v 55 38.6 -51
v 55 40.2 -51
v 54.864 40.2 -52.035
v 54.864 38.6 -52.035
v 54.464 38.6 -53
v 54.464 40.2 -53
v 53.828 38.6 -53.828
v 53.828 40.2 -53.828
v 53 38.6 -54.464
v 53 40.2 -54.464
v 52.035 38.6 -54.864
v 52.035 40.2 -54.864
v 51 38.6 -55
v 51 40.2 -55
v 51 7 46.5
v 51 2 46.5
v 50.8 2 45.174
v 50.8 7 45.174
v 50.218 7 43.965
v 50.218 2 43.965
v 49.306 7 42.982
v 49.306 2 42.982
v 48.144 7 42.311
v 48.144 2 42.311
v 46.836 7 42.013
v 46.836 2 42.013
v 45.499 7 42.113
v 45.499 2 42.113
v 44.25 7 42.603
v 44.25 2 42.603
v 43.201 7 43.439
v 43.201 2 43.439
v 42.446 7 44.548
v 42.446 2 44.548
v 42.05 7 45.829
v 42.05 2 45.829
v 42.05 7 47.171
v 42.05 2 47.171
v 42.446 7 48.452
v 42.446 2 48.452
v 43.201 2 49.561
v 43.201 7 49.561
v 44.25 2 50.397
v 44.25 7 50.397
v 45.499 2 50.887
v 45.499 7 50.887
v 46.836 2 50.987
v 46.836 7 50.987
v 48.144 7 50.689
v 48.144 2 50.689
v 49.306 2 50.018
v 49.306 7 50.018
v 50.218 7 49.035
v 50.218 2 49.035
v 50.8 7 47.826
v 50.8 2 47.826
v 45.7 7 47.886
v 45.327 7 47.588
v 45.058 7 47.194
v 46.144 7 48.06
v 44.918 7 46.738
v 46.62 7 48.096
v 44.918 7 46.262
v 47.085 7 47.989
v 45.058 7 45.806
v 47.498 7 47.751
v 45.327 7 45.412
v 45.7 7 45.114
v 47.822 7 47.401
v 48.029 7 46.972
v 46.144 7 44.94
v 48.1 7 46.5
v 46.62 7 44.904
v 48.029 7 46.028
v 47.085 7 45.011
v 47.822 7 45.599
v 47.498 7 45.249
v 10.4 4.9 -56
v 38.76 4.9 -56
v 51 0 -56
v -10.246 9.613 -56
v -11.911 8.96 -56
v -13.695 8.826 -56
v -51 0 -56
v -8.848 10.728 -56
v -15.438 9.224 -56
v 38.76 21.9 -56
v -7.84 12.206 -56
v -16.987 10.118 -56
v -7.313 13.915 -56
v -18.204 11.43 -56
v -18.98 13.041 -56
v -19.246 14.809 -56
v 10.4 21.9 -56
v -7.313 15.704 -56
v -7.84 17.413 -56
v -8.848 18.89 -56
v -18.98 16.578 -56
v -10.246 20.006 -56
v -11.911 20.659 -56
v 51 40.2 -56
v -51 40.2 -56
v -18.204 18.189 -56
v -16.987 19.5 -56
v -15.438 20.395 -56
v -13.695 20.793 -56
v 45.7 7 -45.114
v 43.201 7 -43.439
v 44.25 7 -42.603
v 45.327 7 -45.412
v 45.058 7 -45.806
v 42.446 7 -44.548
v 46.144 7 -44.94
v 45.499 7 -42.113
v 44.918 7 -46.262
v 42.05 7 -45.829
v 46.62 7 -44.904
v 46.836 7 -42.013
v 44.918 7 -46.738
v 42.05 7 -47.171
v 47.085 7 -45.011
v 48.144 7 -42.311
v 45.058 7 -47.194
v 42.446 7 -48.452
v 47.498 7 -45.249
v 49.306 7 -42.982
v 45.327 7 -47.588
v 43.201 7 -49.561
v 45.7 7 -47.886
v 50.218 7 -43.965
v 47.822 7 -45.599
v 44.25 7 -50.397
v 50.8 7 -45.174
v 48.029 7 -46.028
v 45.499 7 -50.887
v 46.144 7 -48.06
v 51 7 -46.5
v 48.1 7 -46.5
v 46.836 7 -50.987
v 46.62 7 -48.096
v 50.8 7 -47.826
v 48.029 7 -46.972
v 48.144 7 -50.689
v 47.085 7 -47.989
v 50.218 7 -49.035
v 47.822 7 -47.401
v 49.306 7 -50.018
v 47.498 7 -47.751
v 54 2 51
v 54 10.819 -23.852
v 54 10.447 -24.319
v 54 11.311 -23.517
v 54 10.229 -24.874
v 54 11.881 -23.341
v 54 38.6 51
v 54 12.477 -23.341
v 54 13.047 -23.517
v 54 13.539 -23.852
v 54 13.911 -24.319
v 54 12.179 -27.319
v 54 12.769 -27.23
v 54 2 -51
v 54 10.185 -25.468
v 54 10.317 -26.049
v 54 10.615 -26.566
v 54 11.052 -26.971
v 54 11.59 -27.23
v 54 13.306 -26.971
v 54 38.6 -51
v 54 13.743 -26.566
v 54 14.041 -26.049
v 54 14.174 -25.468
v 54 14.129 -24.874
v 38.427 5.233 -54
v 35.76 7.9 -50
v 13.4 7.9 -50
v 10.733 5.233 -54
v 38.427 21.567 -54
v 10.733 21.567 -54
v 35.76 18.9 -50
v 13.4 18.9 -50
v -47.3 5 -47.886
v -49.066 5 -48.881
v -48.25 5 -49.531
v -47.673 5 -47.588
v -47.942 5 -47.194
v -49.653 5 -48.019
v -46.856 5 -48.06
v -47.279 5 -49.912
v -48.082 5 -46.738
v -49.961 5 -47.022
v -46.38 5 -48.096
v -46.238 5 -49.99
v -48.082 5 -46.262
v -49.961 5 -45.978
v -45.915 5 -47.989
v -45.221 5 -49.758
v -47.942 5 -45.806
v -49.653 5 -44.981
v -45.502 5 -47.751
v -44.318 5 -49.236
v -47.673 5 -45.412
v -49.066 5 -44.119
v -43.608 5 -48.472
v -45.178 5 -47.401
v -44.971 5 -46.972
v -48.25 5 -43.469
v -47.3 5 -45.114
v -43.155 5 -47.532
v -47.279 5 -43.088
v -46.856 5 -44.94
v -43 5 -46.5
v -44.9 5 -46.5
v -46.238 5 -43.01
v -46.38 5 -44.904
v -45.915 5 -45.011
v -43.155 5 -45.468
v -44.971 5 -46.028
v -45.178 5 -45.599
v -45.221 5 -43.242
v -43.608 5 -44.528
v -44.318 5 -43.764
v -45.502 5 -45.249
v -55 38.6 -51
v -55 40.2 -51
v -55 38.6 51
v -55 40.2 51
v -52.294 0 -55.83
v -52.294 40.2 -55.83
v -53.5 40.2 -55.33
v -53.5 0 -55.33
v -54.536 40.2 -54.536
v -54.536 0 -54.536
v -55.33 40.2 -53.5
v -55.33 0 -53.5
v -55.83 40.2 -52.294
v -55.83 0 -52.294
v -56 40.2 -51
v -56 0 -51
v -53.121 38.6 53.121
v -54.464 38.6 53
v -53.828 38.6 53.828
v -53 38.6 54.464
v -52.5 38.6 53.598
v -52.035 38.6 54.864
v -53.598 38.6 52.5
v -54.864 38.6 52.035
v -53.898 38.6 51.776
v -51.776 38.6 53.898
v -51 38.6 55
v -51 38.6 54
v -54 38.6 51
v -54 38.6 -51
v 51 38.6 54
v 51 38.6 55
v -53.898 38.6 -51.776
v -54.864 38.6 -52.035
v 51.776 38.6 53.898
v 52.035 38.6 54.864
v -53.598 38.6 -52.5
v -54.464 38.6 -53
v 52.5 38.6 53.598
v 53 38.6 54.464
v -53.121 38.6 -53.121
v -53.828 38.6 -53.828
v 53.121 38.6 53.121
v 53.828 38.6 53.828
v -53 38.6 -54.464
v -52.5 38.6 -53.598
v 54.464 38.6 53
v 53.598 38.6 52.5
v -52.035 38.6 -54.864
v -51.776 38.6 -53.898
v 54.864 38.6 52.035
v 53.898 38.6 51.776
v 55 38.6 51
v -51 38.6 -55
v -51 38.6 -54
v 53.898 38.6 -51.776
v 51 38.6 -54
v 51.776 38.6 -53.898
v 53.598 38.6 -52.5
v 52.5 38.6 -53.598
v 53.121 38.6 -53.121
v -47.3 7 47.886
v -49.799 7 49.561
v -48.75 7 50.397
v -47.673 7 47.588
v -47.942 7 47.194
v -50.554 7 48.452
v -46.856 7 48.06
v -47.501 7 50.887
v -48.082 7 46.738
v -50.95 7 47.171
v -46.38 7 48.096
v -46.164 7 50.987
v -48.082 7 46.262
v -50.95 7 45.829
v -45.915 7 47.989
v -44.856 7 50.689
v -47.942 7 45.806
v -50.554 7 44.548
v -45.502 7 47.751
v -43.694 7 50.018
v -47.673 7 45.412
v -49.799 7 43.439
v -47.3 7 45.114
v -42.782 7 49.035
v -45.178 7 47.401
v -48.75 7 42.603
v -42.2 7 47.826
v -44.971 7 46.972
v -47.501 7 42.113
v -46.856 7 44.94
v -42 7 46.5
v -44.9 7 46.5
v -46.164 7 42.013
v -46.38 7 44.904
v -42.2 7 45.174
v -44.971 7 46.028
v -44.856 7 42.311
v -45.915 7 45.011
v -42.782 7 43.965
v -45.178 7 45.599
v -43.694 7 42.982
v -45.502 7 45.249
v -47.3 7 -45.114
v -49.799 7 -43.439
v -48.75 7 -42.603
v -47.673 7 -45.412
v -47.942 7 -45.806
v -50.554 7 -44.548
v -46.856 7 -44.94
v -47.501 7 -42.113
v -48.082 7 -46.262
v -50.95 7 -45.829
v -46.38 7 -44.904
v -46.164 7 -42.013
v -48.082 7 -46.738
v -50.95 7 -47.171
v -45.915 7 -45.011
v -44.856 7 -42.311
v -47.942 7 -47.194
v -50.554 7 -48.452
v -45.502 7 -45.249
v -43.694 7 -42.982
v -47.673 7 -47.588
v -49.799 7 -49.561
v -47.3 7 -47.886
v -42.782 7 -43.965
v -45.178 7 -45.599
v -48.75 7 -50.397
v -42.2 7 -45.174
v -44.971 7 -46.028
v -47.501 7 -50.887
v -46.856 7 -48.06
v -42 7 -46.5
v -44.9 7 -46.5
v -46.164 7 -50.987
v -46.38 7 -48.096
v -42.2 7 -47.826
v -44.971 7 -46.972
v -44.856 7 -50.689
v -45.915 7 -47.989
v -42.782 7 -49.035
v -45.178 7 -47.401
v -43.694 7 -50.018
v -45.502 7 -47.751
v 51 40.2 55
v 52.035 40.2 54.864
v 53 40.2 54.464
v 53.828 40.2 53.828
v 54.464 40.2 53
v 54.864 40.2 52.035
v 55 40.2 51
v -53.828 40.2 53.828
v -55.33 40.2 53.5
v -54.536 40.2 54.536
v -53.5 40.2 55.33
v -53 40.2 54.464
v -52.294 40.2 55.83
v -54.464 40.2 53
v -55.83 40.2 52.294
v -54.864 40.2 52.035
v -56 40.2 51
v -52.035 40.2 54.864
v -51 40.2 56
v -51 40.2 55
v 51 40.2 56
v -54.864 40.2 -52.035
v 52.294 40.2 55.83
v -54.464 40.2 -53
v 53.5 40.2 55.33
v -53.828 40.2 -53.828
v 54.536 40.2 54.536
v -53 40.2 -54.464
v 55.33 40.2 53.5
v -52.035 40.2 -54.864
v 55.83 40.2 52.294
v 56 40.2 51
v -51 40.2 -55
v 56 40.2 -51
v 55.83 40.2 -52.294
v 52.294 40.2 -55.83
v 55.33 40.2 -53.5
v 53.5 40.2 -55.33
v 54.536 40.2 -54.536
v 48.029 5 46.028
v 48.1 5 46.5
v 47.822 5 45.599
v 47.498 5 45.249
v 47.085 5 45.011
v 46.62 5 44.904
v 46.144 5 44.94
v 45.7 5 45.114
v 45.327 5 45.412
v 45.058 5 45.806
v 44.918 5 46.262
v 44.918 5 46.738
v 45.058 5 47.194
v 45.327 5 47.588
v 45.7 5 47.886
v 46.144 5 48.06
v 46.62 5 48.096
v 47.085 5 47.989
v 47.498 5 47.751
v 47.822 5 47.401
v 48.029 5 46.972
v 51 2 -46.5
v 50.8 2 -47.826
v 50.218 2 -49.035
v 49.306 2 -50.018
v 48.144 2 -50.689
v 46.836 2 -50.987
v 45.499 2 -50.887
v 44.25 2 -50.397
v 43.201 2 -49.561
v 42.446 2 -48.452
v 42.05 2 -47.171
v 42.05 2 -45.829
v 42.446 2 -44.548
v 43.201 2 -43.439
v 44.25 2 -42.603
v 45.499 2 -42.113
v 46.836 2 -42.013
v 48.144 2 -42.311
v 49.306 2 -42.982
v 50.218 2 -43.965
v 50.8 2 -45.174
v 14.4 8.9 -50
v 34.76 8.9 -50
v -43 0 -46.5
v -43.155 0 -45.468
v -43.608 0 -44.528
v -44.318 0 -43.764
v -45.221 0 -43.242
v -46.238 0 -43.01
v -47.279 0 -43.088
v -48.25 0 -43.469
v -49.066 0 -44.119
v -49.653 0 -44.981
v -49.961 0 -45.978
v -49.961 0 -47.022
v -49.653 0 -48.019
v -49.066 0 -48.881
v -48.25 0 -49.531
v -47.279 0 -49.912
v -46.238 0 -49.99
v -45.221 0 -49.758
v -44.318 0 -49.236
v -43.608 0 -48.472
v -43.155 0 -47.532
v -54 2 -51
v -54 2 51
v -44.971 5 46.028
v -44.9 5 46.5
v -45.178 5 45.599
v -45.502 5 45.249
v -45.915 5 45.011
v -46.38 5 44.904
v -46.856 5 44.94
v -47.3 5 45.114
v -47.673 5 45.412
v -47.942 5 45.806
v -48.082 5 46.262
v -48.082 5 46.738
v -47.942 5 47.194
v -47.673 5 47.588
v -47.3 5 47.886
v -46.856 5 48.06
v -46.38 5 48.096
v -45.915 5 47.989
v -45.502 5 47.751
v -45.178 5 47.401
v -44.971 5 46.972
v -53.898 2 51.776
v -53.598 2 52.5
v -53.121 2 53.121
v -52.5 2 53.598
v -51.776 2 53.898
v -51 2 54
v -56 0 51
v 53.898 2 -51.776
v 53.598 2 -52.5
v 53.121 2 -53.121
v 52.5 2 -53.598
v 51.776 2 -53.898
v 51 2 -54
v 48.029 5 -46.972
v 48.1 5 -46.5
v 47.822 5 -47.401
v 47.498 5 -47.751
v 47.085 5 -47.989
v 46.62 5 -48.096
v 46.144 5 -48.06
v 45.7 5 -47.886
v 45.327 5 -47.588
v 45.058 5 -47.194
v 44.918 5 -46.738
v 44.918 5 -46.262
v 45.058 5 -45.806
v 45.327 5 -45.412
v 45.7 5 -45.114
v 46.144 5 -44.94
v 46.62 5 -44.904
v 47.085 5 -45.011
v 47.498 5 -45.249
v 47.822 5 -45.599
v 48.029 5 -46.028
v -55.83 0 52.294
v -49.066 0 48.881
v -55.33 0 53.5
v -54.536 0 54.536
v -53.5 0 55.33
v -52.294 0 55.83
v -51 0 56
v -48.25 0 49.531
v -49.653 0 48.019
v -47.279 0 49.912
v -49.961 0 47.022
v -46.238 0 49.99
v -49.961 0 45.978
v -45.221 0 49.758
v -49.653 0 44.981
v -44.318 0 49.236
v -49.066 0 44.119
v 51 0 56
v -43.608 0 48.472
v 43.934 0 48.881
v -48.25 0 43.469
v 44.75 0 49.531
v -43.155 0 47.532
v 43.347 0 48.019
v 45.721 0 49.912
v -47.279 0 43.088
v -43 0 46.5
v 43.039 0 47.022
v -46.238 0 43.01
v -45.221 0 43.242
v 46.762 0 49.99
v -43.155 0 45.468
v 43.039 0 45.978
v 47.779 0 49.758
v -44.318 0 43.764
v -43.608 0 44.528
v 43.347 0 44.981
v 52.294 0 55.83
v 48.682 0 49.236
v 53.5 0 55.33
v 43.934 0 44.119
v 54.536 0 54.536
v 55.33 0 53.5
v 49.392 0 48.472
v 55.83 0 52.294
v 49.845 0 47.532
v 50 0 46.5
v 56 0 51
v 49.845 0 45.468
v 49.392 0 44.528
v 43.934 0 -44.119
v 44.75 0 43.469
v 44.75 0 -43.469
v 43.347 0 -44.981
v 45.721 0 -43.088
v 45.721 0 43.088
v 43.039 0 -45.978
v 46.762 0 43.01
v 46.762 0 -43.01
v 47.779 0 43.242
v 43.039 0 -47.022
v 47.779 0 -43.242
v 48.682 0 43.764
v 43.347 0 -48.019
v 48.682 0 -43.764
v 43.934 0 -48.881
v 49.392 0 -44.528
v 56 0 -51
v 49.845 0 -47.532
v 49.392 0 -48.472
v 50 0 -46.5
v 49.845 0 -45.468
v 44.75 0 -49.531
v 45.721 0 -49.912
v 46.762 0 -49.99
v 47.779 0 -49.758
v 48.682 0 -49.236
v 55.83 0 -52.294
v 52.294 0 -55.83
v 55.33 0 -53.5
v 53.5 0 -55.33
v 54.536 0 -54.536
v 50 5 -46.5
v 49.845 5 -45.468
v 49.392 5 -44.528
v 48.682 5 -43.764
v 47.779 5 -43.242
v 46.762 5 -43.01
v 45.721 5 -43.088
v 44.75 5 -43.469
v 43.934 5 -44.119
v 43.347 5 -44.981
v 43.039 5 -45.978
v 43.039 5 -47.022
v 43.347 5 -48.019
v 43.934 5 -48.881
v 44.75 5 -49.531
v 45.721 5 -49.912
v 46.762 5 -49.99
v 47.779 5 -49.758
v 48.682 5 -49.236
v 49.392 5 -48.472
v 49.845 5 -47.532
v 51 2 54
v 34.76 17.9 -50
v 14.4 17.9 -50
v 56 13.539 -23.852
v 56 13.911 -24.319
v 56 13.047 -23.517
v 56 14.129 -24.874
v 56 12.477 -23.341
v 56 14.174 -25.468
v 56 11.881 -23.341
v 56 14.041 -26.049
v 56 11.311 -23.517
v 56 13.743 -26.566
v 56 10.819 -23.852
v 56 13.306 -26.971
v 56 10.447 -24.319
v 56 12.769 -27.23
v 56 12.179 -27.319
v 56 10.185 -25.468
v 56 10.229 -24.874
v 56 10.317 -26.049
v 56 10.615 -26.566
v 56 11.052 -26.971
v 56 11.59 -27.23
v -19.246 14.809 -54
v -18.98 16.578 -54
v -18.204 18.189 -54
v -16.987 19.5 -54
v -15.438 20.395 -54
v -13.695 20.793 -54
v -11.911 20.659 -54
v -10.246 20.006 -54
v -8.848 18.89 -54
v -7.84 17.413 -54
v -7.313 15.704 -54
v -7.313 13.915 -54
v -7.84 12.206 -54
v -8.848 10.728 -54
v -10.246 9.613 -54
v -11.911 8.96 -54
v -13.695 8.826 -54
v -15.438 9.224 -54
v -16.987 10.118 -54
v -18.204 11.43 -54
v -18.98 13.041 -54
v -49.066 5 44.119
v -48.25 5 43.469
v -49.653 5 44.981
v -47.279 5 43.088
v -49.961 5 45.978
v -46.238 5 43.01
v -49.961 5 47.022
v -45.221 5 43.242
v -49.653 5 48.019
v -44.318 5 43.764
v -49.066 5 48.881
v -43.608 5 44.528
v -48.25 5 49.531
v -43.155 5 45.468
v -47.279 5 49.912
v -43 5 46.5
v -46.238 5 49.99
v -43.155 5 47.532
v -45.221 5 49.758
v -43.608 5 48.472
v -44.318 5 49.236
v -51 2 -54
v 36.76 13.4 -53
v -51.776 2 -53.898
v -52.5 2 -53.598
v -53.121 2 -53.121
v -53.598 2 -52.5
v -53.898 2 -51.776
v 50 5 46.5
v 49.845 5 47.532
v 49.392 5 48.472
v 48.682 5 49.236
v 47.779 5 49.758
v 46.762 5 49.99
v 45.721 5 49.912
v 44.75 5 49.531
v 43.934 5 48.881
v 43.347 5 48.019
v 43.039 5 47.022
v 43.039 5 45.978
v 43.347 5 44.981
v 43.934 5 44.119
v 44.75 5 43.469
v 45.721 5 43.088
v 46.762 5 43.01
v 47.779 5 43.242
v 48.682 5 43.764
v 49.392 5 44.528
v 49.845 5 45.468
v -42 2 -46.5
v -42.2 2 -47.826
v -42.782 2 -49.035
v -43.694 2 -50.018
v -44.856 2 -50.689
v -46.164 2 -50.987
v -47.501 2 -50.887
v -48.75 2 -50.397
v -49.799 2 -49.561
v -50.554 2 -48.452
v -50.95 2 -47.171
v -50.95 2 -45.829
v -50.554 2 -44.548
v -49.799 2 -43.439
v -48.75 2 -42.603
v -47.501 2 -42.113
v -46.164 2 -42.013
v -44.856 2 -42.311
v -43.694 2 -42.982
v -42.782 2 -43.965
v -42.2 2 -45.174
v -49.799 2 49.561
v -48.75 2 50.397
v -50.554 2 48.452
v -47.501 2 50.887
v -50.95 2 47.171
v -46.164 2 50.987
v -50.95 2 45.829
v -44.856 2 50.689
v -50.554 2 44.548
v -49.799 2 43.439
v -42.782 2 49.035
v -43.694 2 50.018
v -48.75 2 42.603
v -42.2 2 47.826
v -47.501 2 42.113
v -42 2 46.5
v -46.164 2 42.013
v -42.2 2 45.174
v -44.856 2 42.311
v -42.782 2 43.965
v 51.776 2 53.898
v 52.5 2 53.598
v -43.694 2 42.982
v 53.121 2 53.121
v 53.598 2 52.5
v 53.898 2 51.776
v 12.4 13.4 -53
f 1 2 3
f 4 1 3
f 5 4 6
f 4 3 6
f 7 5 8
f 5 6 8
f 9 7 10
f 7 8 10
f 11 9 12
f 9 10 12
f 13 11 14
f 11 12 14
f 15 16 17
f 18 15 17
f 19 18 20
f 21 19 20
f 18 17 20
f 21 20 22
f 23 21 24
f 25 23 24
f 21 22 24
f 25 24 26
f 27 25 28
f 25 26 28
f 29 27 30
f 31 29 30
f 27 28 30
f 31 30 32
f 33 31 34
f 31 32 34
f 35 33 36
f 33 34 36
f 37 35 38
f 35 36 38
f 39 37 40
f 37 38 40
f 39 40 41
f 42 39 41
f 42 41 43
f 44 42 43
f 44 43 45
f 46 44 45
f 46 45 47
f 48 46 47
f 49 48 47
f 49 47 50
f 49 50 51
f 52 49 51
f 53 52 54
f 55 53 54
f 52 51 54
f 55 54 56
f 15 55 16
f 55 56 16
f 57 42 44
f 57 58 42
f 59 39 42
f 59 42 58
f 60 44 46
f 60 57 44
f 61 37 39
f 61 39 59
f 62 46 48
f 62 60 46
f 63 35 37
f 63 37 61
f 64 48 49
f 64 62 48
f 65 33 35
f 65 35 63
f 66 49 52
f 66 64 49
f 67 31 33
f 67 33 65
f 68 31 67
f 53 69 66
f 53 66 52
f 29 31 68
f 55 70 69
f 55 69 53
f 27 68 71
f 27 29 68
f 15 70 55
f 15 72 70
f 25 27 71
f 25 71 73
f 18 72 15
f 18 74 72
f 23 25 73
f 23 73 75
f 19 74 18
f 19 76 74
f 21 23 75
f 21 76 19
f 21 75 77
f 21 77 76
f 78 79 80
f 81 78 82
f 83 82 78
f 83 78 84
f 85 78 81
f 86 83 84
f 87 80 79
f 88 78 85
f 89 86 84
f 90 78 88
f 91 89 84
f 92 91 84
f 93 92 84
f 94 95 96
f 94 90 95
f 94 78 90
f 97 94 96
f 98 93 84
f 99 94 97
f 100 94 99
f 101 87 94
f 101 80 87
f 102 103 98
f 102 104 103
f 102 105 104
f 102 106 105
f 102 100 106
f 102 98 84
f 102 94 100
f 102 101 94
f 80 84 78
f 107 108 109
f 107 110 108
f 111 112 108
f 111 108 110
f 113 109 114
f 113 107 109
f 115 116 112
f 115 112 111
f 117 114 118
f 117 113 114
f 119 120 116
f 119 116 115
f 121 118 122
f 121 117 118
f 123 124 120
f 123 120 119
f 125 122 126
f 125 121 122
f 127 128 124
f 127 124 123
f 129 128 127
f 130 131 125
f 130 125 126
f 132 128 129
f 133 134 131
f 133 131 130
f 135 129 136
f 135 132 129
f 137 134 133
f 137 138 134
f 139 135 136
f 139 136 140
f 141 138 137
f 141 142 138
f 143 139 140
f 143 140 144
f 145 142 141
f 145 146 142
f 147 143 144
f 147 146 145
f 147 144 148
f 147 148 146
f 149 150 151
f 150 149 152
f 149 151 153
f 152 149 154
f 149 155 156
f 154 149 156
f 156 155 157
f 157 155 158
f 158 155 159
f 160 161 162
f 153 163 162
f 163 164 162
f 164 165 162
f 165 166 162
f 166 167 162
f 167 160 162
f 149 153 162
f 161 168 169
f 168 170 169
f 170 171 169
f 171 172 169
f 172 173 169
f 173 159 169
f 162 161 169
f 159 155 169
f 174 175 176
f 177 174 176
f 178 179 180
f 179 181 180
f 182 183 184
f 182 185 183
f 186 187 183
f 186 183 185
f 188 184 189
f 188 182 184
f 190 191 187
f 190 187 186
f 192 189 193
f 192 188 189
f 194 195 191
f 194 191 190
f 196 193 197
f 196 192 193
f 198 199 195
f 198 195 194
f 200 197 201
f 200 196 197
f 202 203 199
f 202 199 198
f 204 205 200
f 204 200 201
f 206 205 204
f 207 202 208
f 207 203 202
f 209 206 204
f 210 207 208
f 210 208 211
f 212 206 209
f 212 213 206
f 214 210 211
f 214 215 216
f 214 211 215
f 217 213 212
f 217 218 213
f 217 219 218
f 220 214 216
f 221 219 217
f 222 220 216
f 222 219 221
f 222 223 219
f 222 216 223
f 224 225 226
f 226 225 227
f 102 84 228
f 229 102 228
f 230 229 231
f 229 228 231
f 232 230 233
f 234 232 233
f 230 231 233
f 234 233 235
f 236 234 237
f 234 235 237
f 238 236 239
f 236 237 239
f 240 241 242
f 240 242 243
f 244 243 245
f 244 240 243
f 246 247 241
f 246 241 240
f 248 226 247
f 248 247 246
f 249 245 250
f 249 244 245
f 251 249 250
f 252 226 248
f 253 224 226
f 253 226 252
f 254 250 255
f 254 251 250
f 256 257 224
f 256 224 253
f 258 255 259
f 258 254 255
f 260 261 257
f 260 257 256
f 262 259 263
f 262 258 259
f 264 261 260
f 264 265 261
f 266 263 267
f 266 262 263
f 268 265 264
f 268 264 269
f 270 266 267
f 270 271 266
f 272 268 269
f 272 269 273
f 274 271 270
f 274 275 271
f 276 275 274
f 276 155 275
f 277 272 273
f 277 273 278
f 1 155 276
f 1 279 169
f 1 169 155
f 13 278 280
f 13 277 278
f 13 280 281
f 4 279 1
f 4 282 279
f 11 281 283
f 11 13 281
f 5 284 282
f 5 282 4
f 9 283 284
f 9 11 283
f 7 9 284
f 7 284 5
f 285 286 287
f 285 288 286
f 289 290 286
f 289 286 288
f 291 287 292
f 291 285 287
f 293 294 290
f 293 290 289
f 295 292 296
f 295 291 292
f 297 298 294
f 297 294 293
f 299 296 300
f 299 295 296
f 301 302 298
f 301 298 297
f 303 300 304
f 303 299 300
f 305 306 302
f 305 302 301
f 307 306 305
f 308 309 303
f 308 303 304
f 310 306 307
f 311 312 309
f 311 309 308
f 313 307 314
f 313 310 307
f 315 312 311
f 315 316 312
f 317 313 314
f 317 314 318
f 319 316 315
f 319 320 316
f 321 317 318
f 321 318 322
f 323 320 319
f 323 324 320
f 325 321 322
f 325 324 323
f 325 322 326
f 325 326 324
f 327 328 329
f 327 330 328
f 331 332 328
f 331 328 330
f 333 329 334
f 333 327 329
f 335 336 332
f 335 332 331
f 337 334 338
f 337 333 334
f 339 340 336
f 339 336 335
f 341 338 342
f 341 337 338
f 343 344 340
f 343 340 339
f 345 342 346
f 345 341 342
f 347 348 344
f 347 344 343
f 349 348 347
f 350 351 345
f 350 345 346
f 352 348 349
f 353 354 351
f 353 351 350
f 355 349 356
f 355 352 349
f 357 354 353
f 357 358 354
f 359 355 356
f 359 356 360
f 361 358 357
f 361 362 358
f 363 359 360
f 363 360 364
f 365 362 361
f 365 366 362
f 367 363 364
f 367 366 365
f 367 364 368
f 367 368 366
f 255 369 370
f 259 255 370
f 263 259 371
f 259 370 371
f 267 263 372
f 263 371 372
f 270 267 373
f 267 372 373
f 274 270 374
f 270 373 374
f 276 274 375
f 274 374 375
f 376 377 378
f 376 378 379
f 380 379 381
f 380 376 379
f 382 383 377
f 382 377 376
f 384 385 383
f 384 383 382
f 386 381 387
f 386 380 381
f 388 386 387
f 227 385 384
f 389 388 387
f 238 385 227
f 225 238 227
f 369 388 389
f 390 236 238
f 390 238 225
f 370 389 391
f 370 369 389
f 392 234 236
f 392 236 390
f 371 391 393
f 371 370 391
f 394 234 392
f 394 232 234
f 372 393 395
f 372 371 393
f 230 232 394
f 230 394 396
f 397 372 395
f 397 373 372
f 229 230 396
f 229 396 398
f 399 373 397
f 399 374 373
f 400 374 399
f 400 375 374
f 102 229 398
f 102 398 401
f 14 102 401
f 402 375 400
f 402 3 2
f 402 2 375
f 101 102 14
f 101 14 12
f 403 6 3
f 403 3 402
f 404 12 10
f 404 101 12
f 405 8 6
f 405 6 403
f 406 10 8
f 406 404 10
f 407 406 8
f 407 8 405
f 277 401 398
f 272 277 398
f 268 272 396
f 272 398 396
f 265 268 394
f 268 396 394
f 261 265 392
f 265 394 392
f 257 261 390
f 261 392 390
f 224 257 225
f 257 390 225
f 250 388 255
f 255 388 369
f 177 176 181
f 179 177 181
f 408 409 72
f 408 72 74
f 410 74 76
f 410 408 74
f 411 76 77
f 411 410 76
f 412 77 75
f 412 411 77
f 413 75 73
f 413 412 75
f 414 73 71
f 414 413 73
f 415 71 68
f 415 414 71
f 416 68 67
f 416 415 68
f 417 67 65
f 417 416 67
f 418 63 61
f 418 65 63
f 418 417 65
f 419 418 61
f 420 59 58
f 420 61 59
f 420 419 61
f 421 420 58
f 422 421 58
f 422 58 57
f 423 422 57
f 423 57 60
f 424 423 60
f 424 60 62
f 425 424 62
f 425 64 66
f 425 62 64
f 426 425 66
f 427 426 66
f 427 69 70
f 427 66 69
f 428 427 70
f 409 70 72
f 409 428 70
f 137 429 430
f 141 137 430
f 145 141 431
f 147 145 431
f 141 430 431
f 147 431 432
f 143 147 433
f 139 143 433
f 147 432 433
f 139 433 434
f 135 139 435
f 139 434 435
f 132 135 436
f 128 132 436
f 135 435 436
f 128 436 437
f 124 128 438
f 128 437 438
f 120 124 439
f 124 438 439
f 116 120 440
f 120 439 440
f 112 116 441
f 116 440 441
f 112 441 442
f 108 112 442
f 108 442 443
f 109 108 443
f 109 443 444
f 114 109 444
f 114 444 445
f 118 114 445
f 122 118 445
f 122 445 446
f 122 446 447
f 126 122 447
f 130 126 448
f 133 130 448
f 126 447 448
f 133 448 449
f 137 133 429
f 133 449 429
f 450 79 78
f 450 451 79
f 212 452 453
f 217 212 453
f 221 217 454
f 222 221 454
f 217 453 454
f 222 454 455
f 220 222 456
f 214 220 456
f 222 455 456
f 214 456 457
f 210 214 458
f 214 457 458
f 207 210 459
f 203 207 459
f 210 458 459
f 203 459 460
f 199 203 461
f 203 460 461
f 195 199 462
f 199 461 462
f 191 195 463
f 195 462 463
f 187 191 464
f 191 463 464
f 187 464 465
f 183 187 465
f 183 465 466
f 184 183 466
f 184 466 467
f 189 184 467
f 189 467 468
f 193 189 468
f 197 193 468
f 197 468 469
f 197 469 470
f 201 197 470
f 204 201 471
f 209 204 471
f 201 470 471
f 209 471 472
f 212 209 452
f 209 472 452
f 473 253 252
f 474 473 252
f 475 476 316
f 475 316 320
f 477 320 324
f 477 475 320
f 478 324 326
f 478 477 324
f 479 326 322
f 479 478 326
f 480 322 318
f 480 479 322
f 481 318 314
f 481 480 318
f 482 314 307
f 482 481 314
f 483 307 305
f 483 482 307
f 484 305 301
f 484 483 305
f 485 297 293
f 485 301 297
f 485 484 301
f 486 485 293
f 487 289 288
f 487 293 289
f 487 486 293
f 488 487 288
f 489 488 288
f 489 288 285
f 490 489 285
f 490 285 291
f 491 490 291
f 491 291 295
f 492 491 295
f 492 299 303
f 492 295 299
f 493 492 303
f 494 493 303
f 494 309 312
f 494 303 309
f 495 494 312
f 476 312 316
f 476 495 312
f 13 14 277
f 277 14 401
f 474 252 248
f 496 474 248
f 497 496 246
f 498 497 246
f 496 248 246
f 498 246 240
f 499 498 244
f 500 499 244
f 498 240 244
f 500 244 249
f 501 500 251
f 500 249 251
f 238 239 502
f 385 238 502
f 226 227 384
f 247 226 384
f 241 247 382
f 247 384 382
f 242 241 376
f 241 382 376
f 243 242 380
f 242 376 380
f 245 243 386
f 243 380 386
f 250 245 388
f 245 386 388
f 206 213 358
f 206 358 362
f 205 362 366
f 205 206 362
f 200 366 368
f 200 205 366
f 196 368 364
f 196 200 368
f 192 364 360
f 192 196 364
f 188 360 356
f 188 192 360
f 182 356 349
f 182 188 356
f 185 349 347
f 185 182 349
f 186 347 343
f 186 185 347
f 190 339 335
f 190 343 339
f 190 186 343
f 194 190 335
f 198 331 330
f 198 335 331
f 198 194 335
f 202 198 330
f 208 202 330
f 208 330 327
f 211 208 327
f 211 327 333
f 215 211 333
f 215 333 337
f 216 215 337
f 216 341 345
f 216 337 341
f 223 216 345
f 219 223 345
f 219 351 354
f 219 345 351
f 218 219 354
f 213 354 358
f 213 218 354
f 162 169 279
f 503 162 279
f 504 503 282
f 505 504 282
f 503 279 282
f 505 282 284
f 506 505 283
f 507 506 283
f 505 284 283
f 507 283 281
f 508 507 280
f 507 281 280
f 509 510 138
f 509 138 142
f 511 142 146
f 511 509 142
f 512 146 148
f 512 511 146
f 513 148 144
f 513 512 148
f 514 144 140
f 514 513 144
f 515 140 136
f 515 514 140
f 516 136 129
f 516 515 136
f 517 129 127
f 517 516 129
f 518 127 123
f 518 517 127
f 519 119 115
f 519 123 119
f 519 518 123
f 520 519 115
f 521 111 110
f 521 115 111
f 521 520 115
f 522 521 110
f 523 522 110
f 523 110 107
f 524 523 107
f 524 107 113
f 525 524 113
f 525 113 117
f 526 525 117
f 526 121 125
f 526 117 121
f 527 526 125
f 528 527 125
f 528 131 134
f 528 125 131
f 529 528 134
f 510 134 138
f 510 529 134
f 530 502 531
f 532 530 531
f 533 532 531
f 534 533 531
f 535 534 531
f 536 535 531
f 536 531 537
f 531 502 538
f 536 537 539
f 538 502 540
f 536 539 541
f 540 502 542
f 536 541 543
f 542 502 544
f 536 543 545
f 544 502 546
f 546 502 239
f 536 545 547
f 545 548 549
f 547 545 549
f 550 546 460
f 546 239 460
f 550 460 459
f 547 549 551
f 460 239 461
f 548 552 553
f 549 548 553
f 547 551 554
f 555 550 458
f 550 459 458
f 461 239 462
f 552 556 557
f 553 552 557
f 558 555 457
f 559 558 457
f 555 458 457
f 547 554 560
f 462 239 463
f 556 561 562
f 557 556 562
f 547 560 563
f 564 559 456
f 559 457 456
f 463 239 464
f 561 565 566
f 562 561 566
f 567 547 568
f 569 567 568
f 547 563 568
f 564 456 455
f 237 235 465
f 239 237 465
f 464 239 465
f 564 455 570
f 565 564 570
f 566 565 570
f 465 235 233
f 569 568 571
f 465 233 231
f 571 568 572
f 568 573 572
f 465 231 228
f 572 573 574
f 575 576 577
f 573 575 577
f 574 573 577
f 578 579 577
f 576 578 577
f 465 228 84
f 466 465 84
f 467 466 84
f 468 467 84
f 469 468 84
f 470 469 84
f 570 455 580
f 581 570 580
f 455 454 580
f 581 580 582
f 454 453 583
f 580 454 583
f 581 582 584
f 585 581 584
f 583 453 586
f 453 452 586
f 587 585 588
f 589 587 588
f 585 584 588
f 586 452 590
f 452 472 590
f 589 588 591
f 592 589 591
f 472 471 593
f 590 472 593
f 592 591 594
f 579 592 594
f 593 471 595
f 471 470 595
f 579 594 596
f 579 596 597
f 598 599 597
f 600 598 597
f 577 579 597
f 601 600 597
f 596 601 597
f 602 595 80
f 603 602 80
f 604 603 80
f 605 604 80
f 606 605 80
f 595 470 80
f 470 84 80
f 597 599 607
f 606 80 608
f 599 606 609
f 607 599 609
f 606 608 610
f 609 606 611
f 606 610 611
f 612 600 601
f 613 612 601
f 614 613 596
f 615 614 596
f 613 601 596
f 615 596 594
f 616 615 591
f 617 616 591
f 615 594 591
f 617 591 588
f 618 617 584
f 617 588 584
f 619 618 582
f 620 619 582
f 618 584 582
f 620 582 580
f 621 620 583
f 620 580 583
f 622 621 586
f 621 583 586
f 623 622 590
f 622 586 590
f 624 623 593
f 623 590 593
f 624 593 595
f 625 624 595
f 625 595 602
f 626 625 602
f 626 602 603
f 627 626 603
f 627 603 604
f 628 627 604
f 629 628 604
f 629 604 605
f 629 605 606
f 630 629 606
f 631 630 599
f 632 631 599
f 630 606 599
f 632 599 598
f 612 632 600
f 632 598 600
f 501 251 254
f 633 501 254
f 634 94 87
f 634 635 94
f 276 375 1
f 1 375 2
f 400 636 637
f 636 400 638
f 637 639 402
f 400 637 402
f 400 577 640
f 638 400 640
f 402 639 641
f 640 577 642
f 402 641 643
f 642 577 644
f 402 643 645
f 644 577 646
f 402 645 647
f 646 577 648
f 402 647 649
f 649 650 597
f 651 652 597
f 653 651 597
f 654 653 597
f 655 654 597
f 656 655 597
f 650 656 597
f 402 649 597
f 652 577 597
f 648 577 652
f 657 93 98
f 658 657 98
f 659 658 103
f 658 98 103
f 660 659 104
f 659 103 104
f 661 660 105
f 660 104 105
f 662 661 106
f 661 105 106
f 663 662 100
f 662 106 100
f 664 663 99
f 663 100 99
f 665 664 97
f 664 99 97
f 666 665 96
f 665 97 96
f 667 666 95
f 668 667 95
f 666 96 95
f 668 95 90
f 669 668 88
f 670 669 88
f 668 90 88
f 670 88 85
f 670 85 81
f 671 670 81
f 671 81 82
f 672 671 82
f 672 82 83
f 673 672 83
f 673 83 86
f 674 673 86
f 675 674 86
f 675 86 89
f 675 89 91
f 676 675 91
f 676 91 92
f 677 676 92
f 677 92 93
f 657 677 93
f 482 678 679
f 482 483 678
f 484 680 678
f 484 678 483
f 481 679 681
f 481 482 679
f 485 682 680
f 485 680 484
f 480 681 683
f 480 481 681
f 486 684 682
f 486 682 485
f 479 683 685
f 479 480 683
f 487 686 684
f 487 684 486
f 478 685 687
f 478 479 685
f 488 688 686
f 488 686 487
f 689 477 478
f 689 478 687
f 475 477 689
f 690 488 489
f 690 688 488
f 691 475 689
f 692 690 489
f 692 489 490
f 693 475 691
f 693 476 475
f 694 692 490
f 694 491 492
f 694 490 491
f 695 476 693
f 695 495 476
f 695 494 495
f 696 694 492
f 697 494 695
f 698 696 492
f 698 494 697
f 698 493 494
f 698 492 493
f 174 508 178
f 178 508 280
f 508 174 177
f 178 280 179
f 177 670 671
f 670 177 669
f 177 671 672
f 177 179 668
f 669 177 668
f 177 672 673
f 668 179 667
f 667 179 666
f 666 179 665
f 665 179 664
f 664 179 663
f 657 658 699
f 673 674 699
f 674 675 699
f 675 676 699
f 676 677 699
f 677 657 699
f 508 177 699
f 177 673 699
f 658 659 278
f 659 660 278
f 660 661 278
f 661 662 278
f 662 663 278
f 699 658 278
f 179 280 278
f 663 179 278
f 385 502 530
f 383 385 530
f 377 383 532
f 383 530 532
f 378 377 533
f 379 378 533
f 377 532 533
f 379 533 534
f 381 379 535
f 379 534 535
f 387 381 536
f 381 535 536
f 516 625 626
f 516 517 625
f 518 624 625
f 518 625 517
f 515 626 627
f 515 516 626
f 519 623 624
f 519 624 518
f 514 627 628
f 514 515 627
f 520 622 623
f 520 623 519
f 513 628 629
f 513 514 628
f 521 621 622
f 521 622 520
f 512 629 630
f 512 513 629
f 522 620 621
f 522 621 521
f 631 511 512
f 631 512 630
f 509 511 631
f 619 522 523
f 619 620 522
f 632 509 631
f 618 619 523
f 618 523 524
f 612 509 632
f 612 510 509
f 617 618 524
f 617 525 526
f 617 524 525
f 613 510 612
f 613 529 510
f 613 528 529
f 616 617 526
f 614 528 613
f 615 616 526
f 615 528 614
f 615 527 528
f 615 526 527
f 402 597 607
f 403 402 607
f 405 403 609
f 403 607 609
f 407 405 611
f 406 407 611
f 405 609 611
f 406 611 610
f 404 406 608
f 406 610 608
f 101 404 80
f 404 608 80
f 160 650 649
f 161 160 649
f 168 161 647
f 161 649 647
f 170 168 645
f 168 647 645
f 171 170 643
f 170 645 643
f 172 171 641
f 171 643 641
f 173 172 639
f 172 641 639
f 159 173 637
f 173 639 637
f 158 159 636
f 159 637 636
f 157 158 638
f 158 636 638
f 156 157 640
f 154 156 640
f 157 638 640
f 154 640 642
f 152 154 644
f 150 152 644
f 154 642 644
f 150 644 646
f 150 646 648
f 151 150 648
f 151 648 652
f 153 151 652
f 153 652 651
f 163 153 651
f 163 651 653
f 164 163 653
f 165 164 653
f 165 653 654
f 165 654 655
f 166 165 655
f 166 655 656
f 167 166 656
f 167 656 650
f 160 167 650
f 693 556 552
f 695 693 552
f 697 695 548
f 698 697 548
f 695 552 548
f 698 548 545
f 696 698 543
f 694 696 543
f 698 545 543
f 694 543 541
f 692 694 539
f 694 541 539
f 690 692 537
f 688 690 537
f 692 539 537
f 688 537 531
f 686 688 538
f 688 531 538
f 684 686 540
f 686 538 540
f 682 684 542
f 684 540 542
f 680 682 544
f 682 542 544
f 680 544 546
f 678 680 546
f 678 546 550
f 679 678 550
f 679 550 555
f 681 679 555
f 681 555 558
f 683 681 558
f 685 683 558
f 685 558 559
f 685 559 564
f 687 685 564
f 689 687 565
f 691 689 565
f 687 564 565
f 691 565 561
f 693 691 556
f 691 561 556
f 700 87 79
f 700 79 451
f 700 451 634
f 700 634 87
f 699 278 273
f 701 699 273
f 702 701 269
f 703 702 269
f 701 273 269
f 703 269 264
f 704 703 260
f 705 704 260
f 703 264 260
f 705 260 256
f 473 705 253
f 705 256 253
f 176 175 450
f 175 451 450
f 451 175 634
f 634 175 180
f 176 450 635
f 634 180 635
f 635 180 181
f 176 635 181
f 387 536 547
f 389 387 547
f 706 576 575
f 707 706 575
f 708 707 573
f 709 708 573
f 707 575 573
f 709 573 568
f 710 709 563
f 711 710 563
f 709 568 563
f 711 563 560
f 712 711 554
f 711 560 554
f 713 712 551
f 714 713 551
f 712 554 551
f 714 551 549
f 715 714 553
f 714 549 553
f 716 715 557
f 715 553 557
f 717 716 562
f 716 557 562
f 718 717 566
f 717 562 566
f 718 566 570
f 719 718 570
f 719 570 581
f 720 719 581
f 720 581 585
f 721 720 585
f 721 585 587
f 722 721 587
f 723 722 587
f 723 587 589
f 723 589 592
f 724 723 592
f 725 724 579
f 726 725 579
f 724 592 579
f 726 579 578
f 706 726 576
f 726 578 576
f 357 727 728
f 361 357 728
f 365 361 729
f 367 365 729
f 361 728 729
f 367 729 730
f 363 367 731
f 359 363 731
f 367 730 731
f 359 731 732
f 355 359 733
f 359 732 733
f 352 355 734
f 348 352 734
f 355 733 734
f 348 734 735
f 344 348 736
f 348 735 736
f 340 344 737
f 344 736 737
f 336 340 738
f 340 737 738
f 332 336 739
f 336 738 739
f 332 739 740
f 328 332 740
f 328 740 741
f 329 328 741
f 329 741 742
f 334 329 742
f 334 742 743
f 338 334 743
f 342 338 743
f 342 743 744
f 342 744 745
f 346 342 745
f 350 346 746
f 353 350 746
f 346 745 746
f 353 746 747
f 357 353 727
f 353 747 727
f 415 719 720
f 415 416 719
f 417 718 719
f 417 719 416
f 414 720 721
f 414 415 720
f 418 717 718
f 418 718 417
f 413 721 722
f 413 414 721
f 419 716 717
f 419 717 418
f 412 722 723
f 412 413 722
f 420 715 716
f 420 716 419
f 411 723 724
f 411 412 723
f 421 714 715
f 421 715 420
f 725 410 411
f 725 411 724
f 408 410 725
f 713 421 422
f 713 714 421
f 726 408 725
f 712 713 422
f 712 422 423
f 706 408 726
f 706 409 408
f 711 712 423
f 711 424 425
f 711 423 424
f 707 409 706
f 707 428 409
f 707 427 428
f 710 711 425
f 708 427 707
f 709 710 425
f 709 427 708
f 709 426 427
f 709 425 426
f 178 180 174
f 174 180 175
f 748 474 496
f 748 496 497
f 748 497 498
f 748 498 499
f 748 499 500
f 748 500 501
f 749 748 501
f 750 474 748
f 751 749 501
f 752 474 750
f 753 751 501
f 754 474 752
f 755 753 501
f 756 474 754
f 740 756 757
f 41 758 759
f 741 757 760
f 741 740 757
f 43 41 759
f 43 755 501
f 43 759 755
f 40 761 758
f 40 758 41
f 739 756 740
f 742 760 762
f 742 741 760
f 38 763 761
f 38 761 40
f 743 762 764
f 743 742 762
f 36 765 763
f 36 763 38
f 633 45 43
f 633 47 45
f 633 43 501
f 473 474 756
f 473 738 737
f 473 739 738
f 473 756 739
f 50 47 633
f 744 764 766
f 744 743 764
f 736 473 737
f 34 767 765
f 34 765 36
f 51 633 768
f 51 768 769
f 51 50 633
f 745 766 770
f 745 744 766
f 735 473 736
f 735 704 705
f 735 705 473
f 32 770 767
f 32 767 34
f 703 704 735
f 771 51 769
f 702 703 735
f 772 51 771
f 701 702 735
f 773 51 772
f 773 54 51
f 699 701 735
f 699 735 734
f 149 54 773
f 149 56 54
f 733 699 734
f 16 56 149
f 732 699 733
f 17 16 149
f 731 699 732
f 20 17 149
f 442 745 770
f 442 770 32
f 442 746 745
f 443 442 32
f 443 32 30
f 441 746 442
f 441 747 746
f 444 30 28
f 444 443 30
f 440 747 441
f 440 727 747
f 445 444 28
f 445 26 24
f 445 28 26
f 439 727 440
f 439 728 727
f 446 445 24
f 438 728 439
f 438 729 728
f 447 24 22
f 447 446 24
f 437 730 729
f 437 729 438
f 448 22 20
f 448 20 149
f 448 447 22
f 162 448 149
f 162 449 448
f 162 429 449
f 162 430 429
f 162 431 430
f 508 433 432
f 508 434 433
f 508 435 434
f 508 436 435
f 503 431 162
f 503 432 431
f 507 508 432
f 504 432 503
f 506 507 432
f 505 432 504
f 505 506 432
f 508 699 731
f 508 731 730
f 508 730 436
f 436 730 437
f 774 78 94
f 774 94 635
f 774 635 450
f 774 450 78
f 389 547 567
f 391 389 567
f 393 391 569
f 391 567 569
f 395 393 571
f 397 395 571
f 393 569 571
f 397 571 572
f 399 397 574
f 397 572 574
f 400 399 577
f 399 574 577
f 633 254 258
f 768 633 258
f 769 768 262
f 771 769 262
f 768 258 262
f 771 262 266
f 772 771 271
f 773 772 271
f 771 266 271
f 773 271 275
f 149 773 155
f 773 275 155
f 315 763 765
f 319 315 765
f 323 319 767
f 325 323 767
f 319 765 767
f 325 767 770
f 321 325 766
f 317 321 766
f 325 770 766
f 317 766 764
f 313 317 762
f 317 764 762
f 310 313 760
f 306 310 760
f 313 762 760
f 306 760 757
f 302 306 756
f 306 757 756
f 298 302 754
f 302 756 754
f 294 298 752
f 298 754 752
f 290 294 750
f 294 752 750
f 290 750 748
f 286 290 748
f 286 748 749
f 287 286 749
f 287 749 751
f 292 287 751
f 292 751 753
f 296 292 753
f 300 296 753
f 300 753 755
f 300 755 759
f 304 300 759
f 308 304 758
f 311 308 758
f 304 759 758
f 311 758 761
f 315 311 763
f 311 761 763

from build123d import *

# Parameters (mm, degrees)
BOSS_EXTRUDE1_DEPTH  = 40.2
CUT_EXTRUDE1_DEPTH   = 1.6
CUT_EXTRUDE2_DEPTH   = 36.6
SKETCH6_R            = 4.5
BOSS_EXTRUDE2_DEPTH  = 5
CUT_EXTRUDE4_START   = -8
SKETCH10_R           = 1.6
CUT_EXTRUDE4_DEPTH   = 42.2
SKETCH11_R           = 3.5
CUT_EXTRUDE6_DEPTH   = 5
LPATTERN1_COUNT      = 2
LPATTERN1_PITCH      = 93
LPATTERN1_COUNT_DIR2 = 2
LPATTERN1_PITCH_DIR2 = 93
SKETCH15_W           = 30.36
SKETCH15_H           = 19
SKETCH17_W           = 22.36
SKETCH17_H           = 11
SKETCH19_W           = 28.36
SKETCH19_H           = 17
SKETCH18_W           = 20.36
SKETCH18_H           = 9
CUT_EXTRUDE7_REACH   = 114
SKETCH21_R           = 2
CUT_EXTRUDE8_REACH   = 114
SKETCH22_R           = 6


with BuildPart() as part:
    # Sketch1 → Boss-Extrude1 (new body)
    with BuildSketch(Plane(origin=(0, 0, 0), x_dir=(1, 0, 0), z_dir=(0, 1, 0))):
        with BuildLine():
            Line((-51, -56), (51, -56))
            ThreePointArc((51, -56), (54.535533906, -54.535533906), (56, -51))
            Line((56, -51), (56, 51))
            ThreePointArc((56, 51), (54.535533906, 54.535533906), (51, 56))
            Line((51, 56), (-51, 56))
            ThreePointArc((-51, 56), (-54.535533906, 54.535533906), (-56, 51))
            Line((-56, 51), (-56, -51))
            ThreePointArc((-56, -51), (-54.535533906, -54.535533906), (-51, -56))
        make_face()
    extrude(amount=BOSS_EXTRUDE1_DEPTH)

    # Sketch3 → Cut-Extrude1 (cut)
    with BuildSketch(Plane(origin=(0, 40.2, 0), x_dir=(1, 0, 0), z_dir=(0, 1, 0))):
        with BuildLine():
            Line((-51, -55), (51, -55))
            ThreePointArc((51, -55), (53.828427125, -53.828427125), (55, -51))
            Line((55, -51), (55, 51))
            ThreePointArc((55, 51), (53.828427125, 53.828427125), (51, 55))
            Line((51, 55), (-51, 55))
            ThreePointArc((-51, 55), (-53.828427125, 53.828427125), (-55, 51))
            Line((-55, 51), (-55, -51))
            ThreePointArc((-55, -51), (-53.828427125, -53.828427125), (-51, -55))
        make_face()
    extrude(amount=-CUT_EXTRUDE1_DEPTH, mode=Mode.SUBTRACT)

    # Sketch4 → Cut-Extrude2 (cut)
    with BuildSketch(Plane(origin=(0, 38.6, 0), x_dir=(1, 0, 0), z_dir=(0, 1, 0))):
        with BuildLine():
            Line((-51, -54), (51, -54))
            ThreePointArc((51, -54), (53.121320344, -53.121320344), (54, -51))
            Line((54, -51), (54, 51))
            ThreePointArc((54, 51), (53.121320344, 53.121320344), (51, 54))
            Line((51, 54), (-51, 54))
            ThreePointArc((-51, 54), (-53.121320344, 53.121320344), (-54, 51))
            Line((-54, 51), (-54, -51))
            ThreePointArc((-54, -51), (-53.121320344, -53.121320344), (-51, -54))
        make_face()
    extrude(amount=-CUT_EXTRUDE2_DEPTH, mode=Mode.SUBTRACT)

    # Sketch6 → Boss-Extrude2 (add)
    with BuildSketch(Plane(origin=(0, 2, 0), x_dir=(1, 0, 0), z_dir=(0, 1, 0))):
        with Locations((-46.5, 46.5)):
            Circle(SKETCH6_R)
    boss_extrude2 = extrude(amount=BOSS_EXTRUDE2_DEPTH)

    # Sketch10 → Cut-Extrude4 (cut)
    with BuildSketch(Plane(origin=(0, 7, 0), x_dir=(1, 0, 0), z_dir=(0, 1, 0)).offset(CUT_EXTRUDE4_START)):
        with Locations((-46.5, 46.5)):
            Circle(SKETCH10_R)
    cut_extrude4 = extrude(amount=CUT_EXTRUDE4_DEPTH, mode=Mode.SUBTRACT)

    # Sketch11 → Cut-Extrude6 (cut)
    with BuildSketch(Plane.XZ):
        with Locations((-46.5, -46.5)):
            Circle(SKETCH11_R)
    cut_extrude6 = extrude(amount=-CUT_EXTRUDE6_DEPTH, mode=Mode.SUBTRACT)

    # LPattern1: Boss-Extrude2, Cut-Extrude4, Cut-Extrude6 2 × 2
    with Locations(*[(j * LPATTERN1_PITCH_DIR2, 0, i * LPATTERN1_PITCH) for i in range(LPATTERN1_COUNT) for j in range(LPATTERN1_COUNT_DIR2) if (i, j) != (0, 0)]):
        add(boss_extrude2)
        add(cut_extrude4, mode=Mode.SUBTRACT)
        add(cut_extrude6, mode=Mode.SUBTRACT)

    # Sketch15 → Loft1 section 0
    with BuildSketch(Plane(origin=(0, 0, -56), x_dir=(-1, 0, 0), z_dir=(0, 0, -1))):
        with Locations((-24.58, 13.4)):
            Rectangle(SKETCH15_W, SKETCH15_H)
    # Sketch17 → Loft1 section 1
    with BuildSketch(Plane.XY.offset(-50)):
        with Locations((24.58, 13.4)):
            Rectangle(SKETCH17_W, SKETCH17_H)
    loft()

    # Sketch19 → Cut-Loft2 section 0
    with BuildSketch(Plane(origin=(0, 0, -56), x_dir=(-1, 0, 0), z_dir=(0, 0, -1))):
        with Locations((-24.58, 13.4)):
            Rectangle(SKETCH19_W, SKETCH19_H)
    # Sketch18 → Cut-Loft2 section 1
    with BuildSketch(Plane.XY.offset(-50)):
        with Locations((24.58, 13.4)):
            Rectangle(SKETCH18_W, SKETCH18_H)
    loft(mode=Mode.SUBTRACT)

    # Sketch21 → Cut-Extrude7 (cut, up to next)
    with BuildSketch(Plane(origin=(56, 0.222876175, 12.489592586), x_dir=(0, 0, -1), z_dir=(1, 0, 0)), mode=Mode.PRIVATE) as cut_extrude7_sk1:
        with Locations((37.808139586, 11.956230245)):
            Circle(SKETCH21_R)
    cut_extrude7_tool1 = extrude(cut_extrude7_sk1.sketch, amount=-CUT_EXTRUDE7_REACH, mode=Mode.PRIVATE) & part.part
    add(cut_extrude7_tool1.solids().sort_by_distance((56, 12.179106, -25.318547))[0], mode=Mode.SUBTRACT)

    # Sketch22 → Cut-Extrude8 (cut, up to next)
    with BuildSketch(Plane(origin=(0, 0, -56), x_dir=(-1, 0, 0), z_dir=(0, 0, -1)), mode=Mode.PRIVATE) as cut_extrude8_sk1:
        with Locations((13.246177, 14.809453668)):
            Circle(SKETCH22_R)
    cut_extrude8_tool1 = extrude(cut_extrude8_sk1.sketch, amount=-CUT_EXTRUDE8_REACH, mode=Mode.PRIVATE) & part.part
    add(cut_extrude8_tool1.solids().sort_by_distance((-13.246177, 14.809454, -56))[0], mode=Mode.SUBTRACT)


solid = part.part
